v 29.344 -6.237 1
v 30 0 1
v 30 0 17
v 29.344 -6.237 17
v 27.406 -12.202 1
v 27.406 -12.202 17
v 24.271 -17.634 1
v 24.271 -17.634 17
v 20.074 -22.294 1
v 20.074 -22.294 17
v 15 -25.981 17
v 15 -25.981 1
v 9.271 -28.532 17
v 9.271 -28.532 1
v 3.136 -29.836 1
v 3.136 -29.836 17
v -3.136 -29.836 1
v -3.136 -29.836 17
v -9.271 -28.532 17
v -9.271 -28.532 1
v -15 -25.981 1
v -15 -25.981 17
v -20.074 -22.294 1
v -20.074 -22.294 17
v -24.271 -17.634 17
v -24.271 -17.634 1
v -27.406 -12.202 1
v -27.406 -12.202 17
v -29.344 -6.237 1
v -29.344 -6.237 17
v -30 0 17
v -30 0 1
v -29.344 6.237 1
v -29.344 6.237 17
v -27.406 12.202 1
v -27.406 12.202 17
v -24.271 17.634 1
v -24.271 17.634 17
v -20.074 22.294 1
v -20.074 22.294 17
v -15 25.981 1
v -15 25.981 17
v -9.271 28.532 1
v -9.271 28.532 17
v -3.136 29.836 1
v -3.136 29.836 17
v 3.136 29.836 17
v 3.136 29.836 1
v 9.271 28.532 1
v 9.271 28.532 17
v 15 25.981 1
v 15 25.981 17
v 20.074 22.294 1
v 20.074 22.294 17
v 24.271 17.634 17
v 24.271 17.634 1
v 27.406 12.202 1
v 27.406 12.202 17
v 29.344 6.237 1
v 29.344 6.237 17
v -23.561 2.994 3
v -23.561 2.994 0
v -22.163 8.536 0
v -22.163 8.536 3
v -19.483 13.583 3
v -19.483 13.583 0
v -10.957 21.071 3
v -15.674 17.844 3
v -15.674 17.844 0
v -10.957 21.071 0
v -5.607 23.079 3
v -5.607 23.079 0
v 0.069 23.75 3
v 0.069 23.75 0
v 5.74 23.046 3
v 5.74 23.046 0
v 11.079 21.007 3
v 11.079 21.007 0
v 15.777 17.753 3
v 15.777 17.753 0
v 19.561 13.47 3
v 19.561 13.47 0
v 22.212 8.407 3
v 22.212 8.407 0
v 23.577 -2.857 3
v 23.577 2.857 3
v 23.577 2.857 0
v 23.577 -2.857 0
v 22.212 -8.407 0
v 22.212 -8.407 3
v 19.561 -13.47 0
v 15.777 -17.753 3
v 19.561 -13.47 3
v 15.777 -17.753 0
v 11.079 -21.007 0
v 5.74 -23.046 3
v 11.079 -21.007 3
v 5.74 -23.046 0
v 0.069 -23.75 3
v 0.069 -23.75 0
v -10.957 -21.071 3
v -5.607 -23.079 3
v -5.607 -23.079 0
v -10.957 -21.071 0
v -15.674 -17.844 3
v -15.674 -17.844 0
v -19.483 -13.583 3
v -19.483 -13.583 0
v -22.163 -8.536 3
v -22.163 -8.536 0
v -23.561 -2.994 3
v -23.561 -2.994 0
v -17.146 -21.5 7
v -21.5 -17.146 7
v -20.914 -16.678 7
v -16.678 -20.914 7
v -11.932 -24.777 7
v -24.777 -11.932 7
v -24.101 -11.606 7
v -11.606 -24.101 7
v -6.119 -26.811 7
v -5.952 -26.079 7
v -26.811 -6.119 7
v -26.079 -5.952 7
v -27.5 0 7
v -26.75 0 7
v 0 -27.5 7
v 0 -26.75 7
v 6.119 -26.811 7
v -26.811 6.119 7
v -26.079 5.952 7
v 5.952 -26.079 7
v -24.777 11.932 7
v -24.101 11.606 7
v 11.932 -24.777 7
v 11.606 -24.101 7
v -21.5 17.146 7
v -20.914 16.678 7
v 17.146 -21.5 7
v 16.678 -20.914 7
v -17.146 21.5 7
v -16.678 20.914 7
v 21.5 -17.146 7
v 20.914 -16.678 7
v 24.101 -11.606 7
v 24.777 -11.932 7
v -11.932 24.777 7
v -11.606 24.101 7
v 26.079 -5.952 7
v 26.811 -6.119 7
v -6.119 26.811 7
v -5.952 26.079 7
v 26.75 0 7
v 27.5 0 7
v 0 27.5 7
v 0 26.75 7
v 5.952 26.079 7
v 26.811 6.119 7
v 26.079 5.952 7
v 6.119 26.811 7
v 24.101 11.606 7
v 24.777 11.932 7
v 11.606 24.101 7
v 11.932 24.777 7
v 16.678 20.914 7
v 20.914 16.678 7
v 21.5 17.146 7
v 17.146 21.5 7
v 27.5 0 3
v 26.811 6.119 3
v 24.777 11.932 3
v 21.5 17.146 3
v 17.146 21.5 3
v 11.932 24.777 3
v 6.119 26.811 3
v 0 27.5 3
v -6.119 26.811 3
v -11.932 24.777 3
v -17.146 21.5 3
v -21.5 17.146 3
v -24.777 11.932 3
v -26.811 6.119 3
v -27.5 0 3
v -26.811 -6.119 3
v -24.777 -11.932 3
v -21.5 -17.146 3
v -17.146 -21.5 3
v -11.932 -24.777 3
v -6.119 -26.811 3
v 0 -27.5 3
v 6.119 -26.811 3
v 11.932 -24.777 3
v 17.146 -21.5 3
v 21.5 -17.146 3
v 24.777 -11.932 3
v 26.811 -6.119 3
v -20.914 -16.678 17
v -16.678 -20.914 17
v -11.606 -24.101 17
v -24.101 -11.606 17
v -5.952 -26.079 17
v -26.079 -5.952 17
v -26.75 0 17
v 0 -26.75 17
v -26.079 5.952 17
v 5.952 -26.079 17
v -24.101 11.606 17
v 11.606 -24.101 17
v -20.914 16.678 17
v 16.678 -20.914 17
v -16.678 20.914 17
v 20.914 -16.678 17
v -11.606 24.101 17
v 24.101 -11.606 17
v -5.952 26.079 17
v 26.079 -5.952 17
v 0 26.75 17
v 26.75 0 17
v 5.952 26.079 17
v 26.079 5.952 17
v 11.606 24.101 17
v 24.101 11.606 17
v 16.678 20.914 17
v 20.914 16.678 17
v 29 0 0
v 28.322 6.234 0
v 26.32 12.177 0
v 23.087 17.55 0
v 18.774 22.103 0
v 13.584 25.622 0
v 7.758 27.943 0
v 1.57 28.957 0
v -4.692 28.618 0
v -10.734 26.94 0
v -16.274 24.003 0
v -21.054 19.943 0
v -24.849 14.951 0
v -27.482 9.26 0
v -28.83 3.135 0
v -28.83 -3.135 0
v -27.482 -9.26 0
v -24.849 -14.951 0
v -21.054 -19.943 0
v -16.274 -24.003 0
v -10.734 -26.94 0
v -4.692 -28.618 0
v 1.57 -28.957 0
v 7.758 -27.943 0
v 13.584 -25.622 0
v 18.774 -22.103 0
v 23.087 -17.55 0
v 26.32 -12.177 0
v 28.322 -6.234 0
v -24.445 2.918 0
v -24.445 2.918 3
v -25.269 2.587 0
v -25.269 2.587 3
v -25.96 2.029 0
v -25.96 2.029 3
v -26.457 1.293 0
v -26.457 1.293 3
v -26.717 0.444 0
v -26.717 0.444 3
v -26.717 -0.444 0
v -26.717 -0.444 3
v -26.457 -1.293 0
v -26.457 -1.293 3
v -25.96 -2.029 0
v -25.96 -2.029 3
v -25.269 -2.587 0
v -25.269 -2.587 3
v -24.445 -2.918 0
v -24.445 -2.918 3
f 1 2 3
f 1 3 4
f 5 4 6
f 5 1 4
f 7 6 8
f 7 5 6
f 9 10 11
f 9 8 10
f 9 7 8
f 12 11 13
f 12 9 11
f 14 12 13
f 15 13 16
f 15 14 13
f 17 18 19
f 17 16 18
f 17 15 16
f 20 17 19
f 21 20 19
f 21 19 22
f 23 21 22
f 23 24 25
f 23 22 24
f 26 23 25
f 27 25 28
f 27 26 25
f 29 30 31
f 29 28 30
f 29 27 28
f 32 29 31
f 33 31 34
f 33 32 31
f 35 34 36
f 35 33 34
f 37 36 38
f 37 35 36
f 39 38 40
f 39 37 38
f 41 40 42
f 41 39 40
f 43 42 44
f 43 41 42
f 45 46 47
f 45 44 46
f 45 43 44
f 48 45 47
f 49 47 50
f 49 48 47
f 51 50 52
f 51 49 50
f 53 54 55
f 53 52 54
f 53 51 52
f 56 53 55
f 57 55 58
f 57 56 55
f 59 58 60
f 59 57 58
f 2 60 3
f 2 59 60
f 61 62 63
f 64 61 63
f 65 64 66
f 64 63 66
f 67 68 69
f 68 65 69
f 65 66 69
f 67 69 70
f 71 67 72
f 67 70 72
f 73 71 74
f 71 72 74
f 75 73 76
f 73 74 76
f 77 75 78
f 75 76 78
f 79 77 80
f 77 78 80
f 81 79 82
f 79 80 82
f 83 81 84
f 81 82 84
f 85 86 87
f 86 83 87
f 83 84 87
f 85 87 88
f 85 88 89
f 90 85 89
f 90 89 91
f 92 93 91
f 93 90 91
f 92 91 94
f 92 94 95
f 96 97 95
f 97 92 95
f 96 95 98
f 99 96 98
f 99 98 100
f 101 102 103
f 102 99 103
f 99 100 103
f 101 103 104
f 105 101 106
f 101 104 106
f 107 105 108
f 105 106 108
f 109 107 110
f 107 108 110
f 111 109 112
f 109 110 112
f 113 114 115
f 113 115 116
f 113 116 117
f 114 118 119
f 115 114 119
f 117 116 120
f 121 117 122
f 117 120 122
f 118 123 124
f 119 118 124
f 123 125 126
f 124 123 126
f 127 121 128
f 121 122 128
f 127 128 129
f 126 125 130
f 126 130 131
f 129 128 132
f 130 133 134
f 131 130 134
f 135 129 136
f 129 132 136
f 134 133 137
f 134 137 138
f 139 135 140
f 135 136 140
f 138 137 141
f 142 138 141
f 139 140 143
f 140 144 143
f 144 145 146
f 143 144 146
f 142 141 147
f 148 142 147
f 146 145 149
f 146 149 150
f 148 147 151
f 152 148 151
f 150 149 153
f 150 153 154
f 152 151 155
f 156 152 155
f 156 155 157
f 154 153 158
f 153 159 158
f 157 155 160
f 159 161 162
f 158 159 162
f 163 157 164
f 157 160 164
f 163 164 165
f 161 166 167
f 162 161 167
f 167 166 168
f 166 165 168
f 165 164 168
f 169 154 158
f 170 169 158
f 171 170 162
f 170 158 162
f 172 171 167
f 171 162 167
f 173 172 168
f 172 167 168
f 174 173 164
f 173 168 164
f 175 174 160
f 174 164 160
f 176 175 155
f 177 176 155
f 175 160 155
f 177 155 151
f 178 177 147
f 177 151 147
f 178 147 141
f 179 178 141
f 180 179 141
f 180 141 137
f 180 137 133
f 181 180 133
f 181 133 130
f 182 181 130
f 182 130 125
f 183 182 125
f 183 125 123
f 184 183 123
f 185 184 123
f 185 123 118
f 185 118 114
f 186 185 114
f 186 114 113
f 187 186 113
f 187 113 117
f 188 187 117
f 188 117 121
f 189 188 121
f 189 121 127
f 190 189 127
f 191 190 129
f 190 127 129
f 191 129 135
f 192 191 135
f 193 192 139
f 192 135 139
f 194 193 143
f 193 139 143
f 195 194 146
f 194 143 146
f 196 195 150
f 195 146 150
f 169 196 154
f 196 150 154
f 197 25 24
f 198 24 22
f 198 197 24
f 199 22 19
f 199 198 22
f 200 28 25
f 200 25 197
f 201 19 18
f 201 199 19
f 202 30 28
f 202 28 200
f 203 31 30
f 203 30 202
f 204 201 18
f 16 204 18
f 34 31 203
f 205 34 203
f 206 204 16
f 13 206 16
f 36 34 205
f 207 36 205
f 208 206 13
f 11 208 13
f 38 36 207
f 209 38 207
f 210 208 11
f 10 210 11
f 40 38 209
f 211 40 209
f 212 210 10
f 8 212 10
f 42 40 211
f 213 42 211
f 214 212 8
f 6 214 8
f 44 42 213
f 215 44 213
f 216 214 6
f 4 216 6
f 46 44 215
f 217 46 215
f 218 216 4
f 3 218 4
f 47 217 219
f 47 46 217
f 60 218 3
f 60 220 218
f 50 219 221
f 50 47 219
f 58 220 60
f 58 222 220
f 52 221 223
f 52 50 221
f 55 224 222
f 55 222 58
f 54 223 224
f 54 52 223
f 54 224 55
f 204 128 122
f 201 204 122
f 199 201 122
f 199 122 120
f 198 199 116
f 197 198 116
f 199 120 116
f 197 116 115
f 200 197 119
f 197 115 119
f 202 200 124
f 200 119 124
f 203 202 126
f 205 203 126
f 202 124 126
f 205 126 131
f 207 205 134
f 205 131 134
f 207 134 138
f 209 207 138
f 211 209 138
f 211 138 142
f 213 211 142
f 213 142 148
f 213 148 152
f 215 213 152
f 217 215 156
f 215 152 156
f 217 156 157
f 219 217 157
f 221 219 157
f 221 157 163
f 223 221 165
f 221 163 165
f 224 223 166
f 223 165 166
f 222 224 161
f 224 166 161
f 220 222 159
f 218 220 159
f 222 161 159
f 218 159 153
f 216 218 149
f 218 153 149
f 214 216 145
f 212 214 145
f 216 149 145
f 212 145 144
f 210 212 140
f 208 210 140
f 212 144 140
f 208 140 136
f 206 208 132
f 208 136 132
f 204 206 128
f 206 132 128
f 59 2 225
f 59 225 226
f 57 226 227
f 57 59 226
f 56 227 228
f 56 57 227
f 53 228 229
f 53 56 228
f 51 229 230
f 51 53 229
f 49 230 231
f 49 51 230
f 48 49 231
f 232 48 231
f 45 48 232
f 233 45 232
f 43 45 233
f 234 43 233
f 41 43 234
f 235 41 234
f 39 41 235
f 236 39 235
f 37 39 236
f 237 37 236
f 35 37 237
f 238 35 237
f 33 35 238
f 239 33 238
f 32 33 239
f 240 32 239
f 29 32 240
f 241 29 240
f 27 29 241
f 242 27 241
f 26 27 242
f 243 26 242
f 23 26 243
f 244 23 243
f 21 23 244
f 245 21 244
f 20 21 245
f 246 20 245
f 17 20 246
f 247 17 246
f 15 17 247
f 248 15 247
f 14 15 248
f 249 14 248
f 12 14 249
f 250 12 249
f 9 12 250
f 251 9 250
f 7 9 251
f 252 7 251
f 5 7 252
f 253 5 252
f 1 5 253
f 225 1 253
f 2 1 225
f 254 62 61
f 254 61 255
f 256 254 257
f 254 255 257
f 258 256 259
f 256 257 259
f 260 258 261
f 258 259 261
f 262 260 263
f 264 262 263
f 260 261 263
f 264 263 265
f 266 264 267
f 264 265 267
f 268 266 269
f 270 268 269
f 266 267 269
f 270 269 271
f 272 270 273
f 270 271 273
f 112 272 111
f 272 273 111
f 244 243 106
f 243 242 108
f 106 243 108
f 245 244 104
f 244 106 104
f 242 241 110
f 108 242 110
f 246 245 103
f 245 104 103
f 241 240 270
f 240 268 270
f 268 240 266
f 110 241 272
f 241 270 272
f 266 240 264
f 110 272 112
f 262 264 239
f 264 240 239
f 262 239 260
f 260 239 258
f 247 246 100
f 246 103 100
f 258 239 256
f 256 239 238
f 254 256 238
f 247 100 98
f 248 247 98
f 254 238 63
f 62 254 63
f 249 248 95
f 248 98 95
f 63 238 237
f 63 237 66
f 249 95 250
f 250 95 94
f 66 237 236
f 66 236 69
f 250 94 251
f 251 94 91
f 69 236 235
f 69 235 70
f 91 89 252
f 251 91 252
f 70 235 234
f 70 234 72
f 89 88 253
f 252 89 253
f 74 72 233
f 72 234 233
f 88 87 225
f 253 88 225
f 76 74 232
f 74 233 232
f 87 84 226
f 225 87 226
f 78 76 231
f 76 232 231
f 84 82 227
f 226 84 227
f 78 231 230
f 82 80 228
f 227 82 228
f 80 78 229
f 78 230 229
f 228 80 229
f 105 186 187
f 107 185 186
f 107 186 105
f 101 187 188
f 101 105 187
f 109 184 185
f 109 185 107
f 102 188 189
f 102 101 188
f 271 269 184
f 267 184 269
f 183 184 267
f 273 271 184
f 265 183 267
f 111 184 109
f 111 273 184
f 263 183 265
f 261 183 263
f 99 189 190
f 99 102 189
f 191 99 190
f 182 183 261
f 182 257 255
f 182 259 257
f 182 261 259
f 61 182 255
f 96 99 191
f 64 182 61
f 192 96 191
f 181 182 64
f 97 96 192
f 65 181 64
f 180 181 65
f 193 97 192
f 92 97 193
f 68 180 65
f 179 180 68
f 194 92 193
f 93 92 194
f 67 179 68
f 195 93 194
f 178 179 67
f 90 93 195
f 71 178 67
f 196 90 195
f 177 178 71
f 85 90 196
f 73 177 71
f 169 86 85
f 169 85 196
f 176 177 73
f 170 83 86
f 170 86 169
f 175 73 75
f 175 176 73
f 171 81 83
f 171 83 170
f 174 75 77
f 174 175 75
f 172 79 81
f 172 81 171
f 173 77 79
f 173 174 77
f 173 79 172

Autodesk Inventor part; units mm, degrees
ref_plane "YZ Plane" through (0, 0, 0) normal (1, 0, 0) x (0, 1, 0)
sketch "Skizze2" plane through (0, 0, 0) normal (0, 0, 1) x (1, 0, 0)
  circle A0 centre (0, 0) radius 30
  dimension "d0" = 60
extrude "Extrusion1" add sketch "Skizze2" along normal blind 17
sketch "Skizze8" plane through (0, 0, 17) normal (0, 0, 1) x (1, 0, 0)
  circle A0 centre (0, 0) radius 30 projected
hole "Bohrung1" at (0, 0, 17) direction (0, 0, -1) diameter 47.5 end through all
ref_plane "Arbeitsebene1" through (0, 0, 3) normal (0, 0, -1) x (-1, 0, 0)
ref_plane "Arbeitsebene2" through (0, 0, 7) normal (0, 0, -1) x (-1, 0, 0)
sketch "Skizze6" plane through (0, 0, 17) normal (0, 0, 1) x (1, 0, 0)
  circle A0 centre (0, 0) radius 23.75 projected
  circle A1 centre (0, 0) radius 30 projected
  circle A2 centre (0, 0) radius 27.5
  dimension "d34" = 55
extrude "Extrusion4" cut sketch "Skizze6" against normal up to surface (4 mm away) from surface at -10 contours A2
sketch "Skizze7" plane through (0, 0, 17) normal (0, 0, 1) x (1, 0, 0)
  circle A0 centre (0, 0) radius 30 projected
hole "Bohrung2" at (0, 0, 17) direction (0, 0, -1) diameter 53.5 depth 10 tip angle 118
thread "Gewinde3" size "M55x1.5" class "6H" standard "ANSI Metric M Profile" length 10
chamfer "Fase4" distance 1 angle 45 1 edges at (-30, 0, 0)
sketch "Skizze9" plane through (0, 0, 0) normal (0, 0, -1) x (-1, 0, 0)
  point P0 (0, 0)
  point P1 (23.75, 0)
  dimension "d51" = 23.75
hole "Bohrung3" at (-23.75, 0, 0) direction (0, 0, 1) diameter 6 end through all
equation "\"Biegeradius\" = Stärke"
equation "\"BreiteBiegungsfreistellung\" = Stärke"
equation "\"TiefeBiegungsfreistellung\" = 0.5 * Stärke"
equation "\"GrößeEckenfreistellung\" = 4 * Stärke"
equation "\"MinimalRest\" = 2 * Stärke"
equation "\"Übergangsradius\" = Biegeradius"
equation "\"JacobiRadiusGröße\" = Stärke"
equation "\"Abstandsgröße\" = Stärke"
equation "\"Stärke\" = 0.5"
properties part number "Überwurfmutter" material "PC/ABS-Kunststoff"
